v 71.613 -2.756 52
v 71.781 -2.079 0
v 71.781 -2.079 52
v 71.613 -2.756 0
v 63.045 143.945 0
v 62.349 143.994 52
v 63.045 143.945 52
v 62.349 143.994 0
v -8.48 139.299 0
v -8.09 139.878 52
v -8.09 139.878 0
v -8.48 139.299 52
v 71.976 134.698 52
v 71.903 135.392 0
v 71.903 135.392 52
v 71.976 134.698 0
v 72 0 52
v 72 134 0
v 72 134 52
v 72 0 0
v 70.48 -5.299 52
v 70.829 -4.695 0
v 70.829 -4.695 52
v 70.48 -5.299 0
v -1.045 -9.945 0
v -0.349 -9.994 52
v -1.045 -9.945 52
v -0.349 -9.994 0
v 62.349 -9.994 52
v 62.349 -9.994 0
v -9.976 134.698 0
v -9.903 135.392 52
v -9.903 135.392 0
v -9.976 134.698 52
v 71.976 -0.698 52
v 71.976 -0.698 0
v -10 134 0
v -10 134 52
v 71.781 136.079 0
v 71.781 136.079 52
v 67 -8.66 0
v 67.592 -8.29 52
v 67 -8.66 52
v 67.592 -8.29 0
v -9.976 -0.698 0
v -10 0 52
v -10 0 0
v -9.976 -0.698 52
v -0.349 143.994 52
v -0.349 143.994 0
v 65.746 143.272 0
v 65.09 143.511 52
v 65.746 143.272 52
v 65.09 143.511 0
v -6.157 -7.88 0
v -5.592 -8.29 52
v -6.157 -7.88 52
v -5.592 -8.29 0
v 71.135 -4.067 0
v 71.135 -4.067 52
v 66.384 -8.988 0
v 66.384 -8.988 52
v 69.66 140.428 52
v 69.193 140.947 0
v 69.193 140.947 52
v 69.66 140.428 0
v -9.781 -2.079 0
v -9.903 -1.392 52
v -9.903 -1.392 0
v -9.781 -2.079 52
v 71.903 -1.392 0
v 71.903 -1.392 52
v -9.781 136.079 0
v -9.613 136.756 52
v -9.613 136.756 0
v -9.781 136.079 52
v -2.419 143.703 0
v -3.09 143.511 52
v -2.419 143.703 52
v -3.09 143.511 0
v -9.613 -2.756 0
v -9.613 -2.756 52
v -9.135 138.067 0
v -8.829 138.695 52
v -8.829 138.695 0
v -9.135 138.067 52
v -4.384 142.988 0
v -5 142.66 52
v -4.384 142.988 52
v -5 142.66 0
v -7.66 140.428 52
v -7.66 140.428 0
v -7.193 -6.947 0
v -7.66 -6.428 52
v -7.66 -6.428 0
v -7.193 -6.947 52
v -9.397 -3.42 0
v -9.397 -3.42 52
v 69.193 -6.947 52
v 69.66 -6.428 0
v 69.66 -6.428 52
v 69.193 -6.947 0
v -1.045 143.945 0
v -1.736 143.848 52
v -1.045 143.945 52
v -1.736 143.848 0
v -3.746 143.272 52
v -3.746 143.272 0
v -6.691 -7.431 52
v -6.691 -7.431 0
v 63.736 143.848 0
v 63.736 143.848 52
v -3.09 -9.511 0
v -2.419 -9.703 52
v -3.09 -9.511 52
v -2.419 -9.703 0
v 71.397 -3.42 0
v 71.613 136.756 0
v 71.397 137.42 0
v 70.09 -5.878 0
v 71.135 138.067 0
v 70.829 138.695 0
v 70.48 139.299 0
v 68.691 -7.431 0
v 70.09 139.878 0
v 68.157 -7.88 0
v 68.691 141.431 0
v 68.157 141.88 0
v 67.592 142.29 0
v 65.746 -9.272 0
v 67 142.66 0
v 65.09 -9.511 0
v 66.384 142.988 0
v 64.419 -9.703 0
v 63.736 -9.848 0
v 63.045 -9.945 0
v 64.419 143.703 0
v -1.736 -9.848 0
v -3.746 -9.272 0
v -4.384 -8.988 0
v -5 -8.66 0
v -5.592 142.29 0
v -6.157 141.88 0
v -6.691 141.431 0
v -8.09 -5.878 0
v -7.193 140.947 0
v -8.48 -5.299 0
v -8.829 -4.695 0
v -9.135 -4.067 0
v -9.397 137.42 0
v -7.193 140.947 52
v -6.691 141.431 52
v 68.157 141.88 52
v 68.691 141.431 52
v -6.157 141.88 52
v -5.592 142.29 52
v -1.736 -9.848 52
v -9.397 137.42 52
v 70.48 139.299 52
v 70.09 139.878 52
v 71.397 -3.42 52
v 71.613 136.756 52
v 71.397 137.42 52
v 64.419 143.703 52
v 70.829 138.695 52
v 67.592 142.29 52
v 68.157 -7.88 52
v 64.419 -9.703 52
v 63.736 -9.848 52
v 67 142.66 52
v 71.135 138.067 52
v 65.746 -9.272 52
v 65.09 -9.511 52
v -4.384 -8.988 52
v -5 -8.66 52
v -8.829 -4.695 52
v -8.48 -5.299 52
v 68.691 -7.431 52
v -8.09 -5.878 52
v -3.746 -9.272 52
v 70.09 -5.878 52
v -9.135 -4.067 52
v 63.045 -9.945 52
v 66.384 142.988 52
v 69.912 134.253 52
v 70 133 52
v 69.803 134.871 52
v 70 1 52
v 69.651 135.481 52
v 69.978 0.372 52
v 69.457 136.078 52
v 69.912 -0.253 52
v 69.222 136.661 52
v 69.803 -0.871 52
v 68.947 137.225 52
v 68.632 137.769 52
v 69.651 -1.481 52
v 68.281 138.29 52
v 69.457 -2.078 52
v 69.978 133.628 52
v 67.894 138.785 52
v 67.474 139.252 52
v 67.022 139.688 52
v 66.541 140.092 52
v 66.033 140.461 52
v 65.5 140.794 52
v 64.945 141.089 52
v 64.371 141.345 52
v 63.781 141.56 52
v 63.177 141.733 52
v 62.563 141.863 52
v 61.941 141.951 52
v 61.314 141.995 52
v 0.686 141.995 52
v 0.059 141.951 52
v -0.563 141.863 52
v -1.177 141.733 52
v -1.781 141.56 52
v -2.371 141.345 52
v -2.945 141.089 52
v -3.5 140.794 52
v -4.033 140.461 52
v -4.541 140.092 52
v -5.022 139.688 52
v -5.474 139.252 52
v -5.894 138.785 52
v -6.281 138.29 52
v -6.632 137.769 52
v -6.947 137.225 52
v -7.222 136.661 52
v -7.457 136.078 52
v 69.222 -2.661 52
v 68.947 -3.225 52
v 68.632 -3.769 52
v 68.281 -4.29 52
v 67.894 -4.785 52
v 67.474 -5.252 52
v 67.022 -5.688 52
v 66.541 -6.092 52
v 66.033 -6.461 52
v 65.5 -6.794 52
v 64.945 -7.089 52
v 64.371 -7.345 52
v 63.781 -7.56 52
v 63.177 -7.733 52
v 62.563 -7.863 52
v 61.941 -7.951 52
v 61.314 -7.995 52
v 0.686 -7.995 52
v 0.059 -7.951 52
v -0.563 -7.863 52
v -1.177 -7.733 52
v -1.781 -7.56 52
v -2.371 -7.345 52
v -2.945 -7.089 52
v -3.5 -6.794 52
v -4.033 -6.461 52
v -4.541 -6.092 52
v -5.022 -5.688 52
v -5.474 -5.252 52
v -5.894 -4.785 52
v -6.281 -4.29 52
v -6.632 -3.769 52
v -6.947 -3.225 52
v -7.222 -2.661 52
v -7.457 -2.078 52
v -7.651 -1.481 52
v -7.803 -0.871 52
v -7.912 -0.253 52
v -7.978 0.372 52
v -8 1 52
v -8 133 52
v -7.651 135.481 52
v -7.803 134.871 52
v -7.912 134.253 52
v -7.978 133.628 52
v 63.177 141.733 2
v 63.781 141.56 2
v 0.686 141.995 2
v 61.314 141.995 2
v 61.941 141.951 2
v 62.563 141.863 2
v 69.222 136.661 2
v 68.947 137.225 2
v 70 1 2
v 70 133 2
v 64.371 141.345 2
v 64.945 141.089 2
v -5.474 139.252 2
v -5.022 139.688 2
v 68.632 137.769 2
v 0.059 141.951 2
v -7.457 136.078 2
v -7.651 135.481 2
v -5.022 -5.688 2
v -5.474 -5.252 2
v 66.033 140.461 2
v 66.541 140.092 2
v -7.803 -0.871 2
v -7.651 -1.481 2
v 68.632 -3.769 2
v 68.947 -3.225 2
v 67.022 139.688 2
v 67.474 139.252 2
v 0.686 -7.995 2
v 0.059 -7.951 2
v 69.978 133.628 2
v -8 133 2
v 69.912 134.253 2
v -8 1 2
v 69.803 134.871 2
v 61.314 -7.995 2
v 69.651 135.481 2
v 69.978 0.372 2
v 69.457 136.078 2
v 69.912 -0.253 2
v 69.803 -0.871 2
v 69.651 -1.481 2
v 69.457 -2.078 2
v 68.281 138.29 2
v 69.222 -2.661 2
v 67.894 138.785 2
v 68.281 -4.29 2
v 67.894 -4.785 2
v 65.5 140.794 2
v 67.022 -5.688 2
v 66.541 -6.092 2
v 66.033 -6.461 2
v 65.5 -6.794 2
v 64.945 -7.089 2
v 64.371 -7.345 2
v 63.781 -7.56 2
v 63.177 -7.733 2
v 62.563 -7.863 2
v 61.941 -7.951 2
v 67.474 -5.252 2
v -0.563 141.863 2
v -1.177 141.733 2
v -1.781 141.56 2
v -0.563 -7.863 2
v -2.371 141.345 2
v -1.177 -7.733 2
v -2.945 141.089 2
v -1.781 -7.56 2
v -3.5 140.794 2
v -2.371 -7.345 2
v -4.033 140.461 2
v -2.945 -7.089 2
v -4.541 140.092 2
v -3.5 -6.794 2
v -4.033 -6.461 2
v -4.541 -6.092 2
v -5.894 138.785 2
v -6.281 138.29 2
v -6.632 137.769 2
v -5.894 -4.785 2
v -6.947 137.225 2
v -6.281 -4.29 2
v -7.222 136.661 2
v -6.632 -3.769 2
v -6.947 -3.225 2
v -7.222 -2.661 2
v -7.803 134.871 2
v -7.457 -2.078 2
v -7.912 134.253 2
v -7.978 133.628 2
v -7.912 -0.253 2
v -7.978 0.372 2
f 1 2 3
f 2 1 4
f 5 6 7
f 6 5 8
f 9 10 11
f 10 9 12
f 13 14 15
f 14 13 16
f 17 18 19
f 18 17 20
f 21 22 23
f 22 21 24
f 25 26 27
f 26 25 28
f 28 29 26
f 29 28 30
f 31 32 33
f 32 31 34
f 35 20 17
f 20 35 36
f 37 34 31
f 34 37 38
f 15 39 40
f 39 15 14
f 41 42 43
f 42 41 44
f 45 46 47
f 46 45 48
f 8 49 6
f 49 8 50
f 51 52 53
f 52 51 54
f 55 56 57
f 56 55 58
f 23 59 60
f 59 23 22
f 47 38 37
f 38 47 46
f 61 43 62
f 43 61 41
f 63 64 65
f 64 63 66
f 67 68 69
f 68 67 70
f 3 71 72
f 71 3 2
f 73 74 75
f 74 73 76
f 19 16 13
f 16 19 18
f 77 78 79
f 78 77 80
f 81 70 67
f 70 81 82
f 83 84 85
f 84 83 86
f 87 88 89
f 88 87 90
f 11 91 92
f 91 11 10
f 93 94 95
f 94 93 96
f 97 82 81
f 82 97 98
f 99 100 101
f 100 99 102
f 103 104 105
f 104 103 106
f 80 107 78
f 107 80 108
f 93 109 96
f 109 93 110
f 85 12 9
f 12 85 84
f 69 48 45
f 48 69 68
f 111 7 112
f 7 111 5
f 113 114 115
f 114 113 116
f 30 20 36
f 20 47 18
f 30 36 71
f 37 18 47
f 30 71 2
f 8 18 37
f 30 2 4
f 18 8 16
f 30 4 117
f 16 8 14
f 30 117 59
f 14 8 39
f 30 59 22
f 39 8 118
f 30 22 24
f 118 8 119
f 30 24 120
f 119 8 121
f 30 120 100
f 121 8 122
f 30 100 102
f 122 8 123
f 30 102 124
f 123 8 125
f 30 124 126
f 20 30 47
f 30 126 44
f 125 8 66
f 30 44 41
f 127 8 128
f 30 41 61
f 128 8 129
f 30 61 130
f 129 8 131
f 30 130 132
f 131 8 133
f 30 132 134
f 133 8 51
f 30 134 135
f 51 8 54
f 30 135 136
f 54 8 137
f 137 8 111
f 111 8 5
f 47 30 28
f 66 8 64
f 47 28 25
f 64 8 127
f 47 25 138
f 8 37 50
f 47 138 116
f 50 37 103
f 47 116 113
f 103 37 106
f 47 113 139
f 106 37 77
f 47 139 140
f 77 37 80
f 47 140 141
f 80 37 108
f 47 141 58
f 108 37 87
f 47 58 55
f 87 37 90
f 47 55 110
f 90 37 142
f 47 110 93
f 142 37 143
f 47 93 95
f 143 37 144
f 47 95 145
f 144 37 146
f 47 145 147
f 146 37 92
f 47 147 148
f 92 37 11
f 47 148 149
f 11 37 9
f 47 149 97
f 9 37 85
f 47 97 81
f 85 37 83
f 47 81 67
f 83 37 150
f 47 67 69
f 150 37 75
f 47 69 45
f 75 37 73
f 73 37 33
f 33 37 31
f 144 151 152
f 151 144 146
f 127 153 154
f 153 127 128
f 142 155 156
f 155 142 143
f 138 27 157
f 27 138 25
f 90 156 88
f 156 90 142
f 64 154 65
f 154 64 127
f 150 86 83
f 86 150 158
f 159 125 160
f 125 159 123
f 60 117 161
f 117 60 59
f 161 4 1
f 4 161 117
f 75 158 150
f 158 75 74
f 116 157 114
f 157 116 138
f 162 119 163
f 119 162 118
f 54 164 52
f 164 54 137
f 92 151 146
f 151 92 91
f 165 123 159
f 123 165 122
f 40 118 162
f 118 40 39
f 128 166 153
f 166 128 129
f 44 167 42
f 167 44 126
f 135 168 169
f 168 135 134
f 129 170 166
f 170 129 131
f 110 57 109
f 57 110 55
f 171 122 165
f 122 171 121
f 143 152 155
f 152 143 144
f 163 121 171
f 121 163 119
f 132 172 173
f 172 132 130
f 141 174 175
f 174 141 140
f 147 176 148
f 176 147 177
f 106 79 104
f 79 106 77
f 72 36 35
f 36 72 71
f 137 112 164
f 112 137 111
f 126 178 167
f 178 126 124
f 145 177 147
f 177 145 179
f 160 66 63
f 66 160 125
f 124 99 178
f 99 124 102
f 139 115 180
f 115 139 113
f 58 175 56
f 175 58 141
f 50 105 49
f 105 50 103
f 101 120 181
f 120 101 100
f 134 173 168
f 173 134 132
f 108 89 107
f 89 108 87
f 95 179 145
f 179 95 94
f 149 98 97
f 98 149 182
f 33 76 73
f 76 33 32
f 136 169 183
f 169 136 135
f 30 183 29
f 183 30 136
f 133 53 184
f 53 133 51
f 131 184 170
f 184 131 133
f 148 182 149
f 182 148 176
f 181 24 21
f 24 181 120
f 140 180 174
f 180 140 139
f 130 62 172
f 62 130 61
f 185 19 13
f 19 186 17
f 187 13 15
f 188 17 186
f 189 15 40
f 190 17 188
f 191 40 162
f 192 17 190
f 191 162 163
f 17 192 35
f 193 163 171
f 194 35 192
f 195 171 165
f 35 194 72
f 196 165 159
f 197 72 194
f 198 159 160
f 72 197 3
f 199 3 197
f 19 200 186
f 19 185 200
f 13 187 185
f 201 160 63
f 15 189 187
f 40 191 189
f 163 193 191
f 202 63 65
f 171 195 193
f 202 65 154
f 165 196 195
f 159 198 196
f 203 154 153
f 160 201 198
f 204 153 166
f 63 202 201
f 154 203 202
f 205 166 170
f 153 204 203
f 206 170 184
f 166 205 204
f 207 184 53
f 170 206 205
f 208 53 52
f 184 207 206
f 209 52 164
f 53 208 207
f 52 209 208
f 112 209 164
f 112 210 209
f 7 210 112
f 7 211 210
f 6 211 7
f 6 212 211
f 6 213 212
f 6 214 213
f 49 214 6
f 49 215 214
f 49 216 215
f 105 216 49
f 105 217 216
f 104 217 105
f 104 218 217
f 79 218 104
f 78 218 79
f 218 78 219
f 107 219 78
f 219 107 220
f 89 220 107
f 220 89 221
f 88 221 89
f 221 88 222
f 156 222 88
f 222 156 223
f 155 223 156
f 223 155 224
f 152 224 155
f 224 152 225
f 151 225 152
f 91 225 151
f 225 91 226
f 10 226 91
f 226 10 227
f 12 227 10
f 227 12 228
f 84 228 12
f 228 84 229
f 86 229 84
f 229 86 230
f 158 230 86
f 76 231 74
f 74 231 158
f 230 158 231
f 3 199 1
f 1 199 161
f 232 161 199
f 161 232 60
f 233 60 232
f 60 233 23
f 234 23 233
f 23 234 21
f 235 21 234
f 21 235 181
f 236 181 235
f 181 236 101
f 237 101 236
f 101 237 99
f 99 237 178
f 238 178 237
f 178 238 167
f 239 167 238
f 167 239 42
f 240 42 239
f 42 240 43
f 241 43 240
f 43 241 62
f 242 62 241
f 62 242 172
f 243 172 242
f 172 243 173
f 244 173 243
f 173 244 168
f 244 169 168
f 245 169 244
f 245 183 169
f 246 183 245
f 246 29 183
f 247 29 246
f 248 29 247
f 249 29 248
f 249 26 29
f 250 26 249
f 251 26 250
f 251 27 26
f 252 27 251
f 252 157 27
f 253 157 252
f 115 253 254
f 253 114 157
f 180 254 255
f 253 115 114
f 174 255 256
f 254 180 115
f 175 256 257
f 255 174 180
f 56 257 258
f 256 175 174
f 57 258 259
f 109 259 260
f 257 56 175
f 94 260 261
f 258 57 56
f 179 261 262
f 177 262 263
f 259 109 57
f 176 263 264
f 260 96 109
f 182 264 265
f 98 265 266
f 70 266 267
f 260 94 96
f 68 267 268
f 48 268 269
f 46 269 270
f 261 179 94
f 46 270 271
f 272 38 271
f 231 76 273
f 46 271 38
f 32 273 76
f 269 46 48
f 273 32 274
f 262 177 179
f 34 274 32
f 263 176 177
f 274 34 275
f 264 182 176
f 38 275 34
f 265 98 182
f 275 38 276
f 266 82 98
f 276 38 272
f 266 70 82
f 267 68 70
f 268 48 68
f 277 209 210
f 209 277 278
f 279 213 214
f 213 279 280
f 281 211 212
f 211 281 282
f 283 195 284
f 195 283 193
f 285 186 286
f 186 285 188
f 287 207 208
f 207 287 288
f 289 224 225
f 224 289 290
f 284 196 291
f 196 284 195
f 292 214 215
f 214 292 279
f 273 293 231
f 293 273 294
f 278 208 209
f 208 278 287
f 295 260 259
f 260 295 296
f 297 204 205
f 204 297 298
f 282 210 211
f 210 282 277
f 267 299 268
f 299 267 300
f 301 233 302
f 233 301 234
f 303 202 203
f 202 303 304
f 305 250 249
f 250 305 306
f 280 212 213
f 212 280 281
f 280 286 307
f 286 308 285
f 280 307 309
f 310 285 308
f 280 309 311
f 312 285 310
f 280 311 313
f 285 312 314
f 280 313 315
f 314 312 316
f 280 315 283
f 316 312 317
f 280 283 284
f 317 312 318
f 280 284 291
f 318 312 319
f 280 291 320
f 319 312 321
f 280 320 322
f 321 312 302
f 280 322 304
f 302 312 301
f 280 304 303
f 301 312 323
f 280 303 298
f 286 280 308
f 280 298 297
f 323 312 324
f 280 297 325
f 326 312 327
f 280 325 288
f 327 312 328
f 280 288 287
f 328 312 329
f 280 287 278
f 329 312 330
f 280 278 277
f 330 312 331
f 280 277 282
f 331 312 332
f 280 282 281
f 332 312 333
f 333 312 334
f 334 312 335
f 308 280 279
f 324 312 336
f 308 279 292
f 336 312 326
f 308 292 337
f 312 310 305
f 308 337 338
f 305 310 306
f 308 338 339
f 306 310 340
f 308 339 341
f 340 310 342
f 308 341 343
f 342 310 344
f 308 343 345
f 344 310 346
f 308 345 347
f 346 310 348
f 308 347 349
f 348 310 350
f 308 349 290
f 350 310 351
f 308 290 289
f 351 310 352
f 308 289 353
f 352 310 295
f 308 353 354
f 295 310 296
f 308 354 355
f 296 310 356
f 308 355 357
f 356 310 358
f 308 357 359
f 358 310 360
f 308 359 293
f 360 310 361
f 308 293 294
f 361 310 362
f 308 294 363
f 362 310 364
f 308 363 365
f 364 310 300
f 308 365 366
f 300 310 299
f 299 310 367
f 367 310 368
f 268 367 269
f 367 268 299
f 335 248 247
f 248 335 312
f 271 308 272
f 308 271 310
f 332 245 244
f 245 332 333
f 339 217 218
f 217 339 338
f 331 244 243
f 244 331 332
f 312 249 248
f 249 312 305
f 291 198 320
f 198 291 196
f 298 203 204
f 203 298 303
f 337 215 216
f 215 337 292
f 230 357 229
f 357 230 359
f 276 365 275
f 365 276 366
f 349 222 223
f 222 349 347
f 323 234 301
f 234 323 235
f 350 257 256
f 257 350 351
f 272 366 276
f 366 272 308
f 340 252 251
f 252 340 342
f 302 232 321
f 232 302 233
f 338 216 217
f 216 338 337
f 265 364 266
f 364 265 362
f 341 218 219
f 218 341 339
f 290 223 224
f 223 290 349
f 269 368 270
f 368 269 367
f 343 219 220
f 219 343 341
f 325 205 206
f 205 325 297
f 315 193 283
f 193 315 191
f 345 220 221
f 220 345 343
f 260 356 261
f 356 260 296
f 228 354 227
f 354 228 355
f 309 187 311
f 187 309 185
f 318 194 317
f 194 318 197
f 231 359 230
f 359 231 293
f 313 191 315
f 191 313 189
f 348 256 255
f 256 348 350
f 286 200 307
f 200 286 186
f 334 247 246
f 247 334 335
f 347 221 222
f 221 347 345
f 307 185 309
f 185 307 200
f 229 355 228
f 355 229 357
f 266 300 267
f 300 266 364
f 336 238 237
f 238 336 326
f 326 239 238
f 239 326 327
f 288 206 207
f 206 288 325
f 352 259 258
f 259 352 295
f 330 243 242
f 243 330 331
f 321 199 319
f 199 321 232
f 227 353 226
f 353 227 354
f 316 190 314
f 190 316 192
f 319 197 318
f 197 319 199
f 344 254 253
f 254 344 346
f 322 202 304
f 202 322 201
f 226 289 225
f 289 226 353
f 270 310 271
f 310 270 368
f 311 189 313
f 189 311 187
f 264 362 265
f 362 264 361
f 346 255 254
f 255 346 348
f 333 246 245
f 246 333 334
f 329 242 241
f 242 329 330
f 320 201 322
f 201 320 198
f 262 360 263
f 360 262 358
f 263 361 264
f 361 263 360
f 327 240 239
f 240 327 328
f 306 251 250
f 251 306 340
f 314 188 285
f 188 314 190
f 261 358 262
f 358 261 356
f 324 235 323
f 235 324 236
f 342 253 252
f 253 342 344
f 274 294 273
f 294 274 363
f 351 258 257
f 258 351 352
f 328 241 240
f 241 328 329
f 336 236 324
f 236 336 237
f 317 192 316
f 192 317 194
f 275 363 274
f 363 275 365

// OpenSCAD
$fn = 90;
module box (x=82,y=154,z=52,d=20,t=2)
{
    A = x-d;
    B = y-d;
    C = z;
    
    //%translate([-d/2,-d/2,0]) cube([x,y,z]);
    difference()
    {
        hull()
        {
            cylinder(d=d, h=C);
            translate([A,0,0]) cylinder(d=d, h=C);
            translate([A,B,0]) cylinder(d=d, h=C);
            translate([0,B,0]) cylinder(d=d, h=C);
        }
        
        translate([-t/2,-t/2,t])
        hull()
        {
            translate([t,t,0]) cylinder(d=d-t, h=C);
            translate([A,t,0]) cylinder(d=d-t, h=C);
            translate([A,B,0]) cylinder(d=d-t, h=C);
            translate([t,B,0]) cylinder(d=d-t, h=C);
        }
    }
}

box();
